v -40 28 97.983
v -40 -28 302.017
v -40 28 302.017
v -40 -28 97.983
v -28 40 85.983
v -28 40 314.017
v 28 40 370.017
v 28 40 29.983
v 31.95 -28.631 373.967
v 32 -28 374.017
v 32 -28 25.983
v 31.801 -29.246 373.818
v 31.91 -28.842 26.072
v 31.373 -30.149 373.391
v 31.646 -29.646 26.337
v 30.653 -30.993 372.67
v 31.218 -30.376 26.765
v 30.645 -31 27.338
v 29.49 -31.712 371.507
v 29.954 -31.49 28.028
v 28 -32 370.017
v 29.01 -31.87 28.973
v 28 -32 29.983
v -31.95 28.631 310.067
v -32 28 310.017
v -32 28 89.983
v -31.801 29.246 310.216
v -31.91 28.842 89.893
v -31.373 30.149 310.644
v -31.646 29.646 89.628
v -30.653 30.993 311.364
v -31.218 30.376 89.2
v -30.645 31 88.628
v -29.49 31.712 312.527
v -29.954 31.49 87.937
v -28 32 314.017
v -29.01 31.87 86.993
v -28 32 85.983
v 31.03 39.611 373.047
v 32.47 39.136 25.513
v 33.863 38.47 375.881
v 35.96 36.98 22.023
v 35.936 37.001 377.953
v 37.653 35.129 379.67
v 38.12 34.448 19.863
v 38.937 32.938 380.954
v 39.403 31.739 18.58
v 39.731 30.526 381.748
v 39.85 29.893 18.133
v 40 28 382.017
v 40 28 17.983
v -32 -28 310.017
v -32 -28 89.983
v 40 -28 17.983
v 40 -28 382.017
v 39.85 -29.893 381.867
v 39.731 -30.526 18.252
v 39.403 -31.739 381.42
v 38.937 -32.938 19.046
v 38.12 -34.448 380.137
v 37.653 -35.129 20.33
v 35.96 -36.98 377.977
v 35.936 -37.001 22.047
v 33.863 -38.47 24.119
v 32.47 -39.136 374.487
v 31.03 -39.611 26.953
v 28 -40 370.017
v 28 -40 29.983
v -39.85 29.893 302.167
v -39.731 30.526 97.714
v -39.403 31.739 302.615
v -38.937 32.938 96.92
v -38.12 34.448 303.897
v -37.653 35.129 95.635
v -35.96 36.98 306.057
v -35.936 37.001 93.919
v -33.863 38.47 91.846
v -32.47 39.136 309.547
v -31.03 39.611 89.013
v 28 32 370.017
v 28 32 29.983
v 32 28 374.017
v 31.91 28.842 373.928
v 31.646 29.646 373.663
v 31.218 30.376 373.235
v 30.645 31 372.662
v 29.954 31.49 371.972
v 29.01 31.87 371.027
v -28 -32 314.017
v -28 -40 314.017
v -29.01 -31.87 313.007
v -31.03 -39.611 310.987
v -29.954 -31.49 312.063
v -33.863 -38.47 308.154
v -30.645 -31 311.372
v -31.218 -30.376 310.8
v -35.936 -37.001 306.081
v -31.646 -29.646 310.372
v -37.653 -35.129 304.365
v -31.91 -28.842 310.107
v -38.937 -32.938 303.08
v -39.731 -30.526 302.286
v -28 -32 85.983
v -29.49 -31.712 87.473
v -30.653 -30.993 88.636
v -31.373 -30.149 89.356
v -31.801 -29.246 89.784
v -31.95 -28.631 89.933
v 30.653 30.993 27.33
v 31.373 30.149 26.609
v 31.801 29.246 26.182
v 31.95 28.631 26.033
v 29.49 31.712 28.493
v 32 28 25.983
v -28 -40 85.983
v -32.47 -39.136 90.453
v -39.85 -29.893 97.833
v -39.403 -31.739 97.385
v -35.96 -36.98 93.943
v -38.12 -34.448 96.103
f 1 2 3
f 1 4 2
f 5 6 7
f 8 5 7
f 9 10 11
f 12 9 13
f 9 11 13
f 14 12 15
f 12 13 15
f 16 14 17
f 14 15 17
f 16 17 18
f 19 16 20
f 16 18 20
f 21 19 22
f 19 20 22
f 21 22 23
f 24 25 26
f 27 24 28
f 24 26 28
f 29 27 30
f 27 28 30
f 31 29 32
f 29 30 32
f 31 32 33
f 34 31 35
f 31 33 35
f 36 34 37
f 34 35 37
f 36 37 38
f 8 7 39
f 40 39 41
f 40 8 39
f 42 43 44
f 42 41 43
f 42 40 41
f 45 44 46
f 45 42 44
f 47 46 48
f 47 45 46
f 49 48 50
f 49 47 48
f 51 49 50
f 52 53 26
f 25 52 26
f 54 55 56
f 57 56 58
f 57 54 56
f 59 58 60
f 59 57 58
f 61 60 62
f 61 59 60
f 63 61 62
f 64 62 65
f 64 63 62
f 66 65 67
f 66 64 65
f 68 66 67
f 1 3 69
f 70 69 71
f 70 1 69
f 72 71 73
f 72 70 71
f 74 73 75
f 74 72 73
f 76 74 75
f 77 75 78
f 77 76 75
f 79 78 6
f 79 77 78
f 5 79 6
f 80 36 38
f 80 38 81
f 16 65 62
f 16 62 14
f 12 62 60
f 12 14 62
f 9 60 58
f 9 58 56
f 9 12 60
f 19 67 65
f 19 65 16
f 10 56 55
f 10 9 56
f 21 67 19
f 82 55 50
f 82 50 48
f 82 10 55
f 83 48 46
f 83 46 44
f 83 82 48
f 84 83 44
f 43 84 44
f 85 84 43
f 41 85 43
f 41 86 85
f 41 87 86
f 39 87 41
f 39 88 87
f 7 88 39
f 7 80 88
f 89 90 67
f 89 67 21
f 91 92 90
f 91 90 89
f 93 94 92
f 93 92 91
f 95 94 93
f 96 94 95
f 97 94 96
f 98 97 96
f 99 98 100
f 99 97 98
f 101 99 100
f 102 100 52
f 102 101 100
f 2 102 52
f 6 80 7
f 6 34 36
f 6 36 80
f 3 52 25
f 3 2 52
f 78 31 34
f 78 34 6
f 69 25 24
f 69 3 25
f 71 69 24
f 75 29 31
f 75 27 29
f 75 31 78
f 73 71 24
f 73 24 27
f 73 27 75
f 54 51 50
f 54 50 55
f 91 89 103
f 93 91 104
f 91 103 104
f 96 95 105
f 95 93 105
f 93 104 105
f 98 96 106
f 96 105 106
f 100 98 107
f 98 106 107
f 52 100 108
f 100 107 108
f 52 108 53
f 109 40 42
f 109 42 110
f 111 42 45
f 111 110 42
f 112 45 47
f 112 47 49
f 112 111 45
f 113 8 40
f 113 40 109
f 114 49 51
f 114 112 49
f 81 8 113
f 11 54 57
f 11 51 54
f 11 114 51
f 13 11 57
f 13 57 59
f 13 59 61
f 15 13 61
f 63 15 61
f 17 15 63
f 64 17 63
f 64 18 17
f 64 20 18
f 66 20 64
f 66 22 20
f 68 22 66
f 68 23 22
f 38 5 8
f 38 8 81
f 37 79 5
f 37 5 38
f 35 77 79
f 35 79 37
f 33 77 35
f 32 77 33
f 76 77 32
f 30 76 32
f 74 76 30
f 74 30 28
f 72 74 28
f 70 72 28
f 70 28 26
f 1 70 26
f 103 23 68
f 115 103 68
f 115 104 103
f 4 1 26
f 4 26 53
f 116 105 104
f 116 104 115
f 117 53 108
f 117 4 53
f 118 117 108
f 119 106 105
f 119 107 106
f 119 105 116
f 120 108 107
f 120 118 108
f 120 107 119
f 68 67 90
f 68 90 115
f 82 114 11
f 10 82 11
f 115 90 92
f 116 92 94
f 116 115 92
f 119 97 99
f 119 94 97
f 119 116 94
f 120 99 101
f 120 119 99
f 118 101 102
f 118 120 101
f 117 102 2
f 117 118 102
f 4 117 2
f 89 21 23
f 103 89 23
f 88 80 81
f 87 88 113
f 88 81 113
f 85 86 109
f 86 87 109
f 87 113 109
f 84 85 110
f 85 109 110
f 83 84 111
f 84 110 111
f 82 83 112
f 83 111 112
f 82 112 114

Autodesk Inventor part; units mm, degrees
ref_plane "Start Plane" through (0, 0, 17.9828) normal (0, 0, 1) x (1, 0, 0)
ref_plane "End Plane" through (0, 0, 382.0172) normal (0, 0, 1) x (1, 0, 0)
sketch "Sketch" plane through (0, 0, 0) normal (0, 0, 1) x (1, 0, 0)
  line L0 (-40, -28) -> (-40, 28)
  line L1 (-28, 40) -> (28, 40)
  line L2 (40, 28) -> (40, -28)
  line L3 (28, -40) -> (-28, -40)
  arc A0 (-40, -28) -> (-28, -40) centre (-28, -28) ccw
  arc A1 (-28, 40) -> (-40, 28) centre (-28, 28) ccw
  arc A2 (40, 28) -> (28, 40) centre (28, 28) ccw
  arc A3 (28, -40) -> (40, -28) centre (28, -28) ccw
  arc A4 (-28, 32) -> (-32, 28) centre (-28, 28) ccw
  line L4 (-28, 32) -> (28, 32)
  arc A5 (32, 28) -> (28, 32) centre (28, 28) ccw
  line L5 (32, 28) -> (32, -28)
  arc A6 (28, -32) -> (32, -28) centre (28, -28) ccw
  line L6 (28, -32) -> (-28, -32)
  arc A7 (-32, -28) -> (-28, -32) centre (-28, -28) ccw
  line L7 (-32, -28) -> (-32, 28)
  line L8 (0, 59.4794) -> (0, -59.4794) construction
  line L9 (-59.4794, 0) -> (59.4794, 0) construction
  dimension "d7" = 12
  dimension "d10" = 80
  dimension "d11" = 80
  dimension "d12" = 8
  dimension "d15" = 40
  dimension "d16" = 40
extrude "Body" add sketch "Sketch" along normal up to surface (364.0345 mm away) from surface at 17.9828
sketch "Sketch3" plane through (0, 0, 0) normal (0, 0, 1) x (1, 0, 0)
  line L0 (0, 0) -> (10, 0)
ref_plane "Work Plane3" through (0, 0, 0) normal (0, -1, 0) x (1, 0, 0)
ref_plane "Work Plane4" through (536.0982, -972, -478.1154) normal (-0.7071, 0, -0.7071) x (-0.7071, 0, 0.7071)
split "Split1" plane through (536.0982, -972, -478.1154) removes the side toward (-0.7071, 0, -0.7071)
ref_plane "Work Plane5" through (-171.0086, 28, 171.0086) normal (-0.7071, 0, 0.7071) x (0.7071, 0, 0.7071)
split "Split2" plane through (-171.0086, 28, 171.0086) removes the side toward (-0.7071, 0, 0.7071)
sketch "Sketch4" plane through (0, 0, 0) normal (0, -1, 0) x (1, 0, 0)
  line L0 (-2, 17.9828) -> (12, 17.9828) projected
  line L1 (-2, 382.0172) -> (12, 382.0172) projected
  dimension "d18" = 364.0345
equation "\"d7\" = G_IR"
equation "\"d10\" = G_H"
equation "\"d11\" = G_W"
equation "\"d12\" = G_T"
equation "\"d15\" = 0.5 * d10"
equation "\"d16\" = 0.5 * d11"
equation "\"d3\" = G_L"
equation "\"G_W\" = 80"
equation "\"G_H\" = 80"
equation "\"G_T\" = 8"
equation "\"G_IR\" = 12"
equation "\"G_L\" = d18"
equation "\"G_OFFSET_START\" = -17.98276"
equation "\"G_OFFSET_END\" = -17.98276"
equation "\"d13\" = -G_OFFSET_START"
equation "\"d14\" = G_OFFSET_END + B_L"
equation "\"B_L\" = 400"
properties part number "ISO 12633-2 - 80x80x8 - 364.03" material "Steel, Mild"
